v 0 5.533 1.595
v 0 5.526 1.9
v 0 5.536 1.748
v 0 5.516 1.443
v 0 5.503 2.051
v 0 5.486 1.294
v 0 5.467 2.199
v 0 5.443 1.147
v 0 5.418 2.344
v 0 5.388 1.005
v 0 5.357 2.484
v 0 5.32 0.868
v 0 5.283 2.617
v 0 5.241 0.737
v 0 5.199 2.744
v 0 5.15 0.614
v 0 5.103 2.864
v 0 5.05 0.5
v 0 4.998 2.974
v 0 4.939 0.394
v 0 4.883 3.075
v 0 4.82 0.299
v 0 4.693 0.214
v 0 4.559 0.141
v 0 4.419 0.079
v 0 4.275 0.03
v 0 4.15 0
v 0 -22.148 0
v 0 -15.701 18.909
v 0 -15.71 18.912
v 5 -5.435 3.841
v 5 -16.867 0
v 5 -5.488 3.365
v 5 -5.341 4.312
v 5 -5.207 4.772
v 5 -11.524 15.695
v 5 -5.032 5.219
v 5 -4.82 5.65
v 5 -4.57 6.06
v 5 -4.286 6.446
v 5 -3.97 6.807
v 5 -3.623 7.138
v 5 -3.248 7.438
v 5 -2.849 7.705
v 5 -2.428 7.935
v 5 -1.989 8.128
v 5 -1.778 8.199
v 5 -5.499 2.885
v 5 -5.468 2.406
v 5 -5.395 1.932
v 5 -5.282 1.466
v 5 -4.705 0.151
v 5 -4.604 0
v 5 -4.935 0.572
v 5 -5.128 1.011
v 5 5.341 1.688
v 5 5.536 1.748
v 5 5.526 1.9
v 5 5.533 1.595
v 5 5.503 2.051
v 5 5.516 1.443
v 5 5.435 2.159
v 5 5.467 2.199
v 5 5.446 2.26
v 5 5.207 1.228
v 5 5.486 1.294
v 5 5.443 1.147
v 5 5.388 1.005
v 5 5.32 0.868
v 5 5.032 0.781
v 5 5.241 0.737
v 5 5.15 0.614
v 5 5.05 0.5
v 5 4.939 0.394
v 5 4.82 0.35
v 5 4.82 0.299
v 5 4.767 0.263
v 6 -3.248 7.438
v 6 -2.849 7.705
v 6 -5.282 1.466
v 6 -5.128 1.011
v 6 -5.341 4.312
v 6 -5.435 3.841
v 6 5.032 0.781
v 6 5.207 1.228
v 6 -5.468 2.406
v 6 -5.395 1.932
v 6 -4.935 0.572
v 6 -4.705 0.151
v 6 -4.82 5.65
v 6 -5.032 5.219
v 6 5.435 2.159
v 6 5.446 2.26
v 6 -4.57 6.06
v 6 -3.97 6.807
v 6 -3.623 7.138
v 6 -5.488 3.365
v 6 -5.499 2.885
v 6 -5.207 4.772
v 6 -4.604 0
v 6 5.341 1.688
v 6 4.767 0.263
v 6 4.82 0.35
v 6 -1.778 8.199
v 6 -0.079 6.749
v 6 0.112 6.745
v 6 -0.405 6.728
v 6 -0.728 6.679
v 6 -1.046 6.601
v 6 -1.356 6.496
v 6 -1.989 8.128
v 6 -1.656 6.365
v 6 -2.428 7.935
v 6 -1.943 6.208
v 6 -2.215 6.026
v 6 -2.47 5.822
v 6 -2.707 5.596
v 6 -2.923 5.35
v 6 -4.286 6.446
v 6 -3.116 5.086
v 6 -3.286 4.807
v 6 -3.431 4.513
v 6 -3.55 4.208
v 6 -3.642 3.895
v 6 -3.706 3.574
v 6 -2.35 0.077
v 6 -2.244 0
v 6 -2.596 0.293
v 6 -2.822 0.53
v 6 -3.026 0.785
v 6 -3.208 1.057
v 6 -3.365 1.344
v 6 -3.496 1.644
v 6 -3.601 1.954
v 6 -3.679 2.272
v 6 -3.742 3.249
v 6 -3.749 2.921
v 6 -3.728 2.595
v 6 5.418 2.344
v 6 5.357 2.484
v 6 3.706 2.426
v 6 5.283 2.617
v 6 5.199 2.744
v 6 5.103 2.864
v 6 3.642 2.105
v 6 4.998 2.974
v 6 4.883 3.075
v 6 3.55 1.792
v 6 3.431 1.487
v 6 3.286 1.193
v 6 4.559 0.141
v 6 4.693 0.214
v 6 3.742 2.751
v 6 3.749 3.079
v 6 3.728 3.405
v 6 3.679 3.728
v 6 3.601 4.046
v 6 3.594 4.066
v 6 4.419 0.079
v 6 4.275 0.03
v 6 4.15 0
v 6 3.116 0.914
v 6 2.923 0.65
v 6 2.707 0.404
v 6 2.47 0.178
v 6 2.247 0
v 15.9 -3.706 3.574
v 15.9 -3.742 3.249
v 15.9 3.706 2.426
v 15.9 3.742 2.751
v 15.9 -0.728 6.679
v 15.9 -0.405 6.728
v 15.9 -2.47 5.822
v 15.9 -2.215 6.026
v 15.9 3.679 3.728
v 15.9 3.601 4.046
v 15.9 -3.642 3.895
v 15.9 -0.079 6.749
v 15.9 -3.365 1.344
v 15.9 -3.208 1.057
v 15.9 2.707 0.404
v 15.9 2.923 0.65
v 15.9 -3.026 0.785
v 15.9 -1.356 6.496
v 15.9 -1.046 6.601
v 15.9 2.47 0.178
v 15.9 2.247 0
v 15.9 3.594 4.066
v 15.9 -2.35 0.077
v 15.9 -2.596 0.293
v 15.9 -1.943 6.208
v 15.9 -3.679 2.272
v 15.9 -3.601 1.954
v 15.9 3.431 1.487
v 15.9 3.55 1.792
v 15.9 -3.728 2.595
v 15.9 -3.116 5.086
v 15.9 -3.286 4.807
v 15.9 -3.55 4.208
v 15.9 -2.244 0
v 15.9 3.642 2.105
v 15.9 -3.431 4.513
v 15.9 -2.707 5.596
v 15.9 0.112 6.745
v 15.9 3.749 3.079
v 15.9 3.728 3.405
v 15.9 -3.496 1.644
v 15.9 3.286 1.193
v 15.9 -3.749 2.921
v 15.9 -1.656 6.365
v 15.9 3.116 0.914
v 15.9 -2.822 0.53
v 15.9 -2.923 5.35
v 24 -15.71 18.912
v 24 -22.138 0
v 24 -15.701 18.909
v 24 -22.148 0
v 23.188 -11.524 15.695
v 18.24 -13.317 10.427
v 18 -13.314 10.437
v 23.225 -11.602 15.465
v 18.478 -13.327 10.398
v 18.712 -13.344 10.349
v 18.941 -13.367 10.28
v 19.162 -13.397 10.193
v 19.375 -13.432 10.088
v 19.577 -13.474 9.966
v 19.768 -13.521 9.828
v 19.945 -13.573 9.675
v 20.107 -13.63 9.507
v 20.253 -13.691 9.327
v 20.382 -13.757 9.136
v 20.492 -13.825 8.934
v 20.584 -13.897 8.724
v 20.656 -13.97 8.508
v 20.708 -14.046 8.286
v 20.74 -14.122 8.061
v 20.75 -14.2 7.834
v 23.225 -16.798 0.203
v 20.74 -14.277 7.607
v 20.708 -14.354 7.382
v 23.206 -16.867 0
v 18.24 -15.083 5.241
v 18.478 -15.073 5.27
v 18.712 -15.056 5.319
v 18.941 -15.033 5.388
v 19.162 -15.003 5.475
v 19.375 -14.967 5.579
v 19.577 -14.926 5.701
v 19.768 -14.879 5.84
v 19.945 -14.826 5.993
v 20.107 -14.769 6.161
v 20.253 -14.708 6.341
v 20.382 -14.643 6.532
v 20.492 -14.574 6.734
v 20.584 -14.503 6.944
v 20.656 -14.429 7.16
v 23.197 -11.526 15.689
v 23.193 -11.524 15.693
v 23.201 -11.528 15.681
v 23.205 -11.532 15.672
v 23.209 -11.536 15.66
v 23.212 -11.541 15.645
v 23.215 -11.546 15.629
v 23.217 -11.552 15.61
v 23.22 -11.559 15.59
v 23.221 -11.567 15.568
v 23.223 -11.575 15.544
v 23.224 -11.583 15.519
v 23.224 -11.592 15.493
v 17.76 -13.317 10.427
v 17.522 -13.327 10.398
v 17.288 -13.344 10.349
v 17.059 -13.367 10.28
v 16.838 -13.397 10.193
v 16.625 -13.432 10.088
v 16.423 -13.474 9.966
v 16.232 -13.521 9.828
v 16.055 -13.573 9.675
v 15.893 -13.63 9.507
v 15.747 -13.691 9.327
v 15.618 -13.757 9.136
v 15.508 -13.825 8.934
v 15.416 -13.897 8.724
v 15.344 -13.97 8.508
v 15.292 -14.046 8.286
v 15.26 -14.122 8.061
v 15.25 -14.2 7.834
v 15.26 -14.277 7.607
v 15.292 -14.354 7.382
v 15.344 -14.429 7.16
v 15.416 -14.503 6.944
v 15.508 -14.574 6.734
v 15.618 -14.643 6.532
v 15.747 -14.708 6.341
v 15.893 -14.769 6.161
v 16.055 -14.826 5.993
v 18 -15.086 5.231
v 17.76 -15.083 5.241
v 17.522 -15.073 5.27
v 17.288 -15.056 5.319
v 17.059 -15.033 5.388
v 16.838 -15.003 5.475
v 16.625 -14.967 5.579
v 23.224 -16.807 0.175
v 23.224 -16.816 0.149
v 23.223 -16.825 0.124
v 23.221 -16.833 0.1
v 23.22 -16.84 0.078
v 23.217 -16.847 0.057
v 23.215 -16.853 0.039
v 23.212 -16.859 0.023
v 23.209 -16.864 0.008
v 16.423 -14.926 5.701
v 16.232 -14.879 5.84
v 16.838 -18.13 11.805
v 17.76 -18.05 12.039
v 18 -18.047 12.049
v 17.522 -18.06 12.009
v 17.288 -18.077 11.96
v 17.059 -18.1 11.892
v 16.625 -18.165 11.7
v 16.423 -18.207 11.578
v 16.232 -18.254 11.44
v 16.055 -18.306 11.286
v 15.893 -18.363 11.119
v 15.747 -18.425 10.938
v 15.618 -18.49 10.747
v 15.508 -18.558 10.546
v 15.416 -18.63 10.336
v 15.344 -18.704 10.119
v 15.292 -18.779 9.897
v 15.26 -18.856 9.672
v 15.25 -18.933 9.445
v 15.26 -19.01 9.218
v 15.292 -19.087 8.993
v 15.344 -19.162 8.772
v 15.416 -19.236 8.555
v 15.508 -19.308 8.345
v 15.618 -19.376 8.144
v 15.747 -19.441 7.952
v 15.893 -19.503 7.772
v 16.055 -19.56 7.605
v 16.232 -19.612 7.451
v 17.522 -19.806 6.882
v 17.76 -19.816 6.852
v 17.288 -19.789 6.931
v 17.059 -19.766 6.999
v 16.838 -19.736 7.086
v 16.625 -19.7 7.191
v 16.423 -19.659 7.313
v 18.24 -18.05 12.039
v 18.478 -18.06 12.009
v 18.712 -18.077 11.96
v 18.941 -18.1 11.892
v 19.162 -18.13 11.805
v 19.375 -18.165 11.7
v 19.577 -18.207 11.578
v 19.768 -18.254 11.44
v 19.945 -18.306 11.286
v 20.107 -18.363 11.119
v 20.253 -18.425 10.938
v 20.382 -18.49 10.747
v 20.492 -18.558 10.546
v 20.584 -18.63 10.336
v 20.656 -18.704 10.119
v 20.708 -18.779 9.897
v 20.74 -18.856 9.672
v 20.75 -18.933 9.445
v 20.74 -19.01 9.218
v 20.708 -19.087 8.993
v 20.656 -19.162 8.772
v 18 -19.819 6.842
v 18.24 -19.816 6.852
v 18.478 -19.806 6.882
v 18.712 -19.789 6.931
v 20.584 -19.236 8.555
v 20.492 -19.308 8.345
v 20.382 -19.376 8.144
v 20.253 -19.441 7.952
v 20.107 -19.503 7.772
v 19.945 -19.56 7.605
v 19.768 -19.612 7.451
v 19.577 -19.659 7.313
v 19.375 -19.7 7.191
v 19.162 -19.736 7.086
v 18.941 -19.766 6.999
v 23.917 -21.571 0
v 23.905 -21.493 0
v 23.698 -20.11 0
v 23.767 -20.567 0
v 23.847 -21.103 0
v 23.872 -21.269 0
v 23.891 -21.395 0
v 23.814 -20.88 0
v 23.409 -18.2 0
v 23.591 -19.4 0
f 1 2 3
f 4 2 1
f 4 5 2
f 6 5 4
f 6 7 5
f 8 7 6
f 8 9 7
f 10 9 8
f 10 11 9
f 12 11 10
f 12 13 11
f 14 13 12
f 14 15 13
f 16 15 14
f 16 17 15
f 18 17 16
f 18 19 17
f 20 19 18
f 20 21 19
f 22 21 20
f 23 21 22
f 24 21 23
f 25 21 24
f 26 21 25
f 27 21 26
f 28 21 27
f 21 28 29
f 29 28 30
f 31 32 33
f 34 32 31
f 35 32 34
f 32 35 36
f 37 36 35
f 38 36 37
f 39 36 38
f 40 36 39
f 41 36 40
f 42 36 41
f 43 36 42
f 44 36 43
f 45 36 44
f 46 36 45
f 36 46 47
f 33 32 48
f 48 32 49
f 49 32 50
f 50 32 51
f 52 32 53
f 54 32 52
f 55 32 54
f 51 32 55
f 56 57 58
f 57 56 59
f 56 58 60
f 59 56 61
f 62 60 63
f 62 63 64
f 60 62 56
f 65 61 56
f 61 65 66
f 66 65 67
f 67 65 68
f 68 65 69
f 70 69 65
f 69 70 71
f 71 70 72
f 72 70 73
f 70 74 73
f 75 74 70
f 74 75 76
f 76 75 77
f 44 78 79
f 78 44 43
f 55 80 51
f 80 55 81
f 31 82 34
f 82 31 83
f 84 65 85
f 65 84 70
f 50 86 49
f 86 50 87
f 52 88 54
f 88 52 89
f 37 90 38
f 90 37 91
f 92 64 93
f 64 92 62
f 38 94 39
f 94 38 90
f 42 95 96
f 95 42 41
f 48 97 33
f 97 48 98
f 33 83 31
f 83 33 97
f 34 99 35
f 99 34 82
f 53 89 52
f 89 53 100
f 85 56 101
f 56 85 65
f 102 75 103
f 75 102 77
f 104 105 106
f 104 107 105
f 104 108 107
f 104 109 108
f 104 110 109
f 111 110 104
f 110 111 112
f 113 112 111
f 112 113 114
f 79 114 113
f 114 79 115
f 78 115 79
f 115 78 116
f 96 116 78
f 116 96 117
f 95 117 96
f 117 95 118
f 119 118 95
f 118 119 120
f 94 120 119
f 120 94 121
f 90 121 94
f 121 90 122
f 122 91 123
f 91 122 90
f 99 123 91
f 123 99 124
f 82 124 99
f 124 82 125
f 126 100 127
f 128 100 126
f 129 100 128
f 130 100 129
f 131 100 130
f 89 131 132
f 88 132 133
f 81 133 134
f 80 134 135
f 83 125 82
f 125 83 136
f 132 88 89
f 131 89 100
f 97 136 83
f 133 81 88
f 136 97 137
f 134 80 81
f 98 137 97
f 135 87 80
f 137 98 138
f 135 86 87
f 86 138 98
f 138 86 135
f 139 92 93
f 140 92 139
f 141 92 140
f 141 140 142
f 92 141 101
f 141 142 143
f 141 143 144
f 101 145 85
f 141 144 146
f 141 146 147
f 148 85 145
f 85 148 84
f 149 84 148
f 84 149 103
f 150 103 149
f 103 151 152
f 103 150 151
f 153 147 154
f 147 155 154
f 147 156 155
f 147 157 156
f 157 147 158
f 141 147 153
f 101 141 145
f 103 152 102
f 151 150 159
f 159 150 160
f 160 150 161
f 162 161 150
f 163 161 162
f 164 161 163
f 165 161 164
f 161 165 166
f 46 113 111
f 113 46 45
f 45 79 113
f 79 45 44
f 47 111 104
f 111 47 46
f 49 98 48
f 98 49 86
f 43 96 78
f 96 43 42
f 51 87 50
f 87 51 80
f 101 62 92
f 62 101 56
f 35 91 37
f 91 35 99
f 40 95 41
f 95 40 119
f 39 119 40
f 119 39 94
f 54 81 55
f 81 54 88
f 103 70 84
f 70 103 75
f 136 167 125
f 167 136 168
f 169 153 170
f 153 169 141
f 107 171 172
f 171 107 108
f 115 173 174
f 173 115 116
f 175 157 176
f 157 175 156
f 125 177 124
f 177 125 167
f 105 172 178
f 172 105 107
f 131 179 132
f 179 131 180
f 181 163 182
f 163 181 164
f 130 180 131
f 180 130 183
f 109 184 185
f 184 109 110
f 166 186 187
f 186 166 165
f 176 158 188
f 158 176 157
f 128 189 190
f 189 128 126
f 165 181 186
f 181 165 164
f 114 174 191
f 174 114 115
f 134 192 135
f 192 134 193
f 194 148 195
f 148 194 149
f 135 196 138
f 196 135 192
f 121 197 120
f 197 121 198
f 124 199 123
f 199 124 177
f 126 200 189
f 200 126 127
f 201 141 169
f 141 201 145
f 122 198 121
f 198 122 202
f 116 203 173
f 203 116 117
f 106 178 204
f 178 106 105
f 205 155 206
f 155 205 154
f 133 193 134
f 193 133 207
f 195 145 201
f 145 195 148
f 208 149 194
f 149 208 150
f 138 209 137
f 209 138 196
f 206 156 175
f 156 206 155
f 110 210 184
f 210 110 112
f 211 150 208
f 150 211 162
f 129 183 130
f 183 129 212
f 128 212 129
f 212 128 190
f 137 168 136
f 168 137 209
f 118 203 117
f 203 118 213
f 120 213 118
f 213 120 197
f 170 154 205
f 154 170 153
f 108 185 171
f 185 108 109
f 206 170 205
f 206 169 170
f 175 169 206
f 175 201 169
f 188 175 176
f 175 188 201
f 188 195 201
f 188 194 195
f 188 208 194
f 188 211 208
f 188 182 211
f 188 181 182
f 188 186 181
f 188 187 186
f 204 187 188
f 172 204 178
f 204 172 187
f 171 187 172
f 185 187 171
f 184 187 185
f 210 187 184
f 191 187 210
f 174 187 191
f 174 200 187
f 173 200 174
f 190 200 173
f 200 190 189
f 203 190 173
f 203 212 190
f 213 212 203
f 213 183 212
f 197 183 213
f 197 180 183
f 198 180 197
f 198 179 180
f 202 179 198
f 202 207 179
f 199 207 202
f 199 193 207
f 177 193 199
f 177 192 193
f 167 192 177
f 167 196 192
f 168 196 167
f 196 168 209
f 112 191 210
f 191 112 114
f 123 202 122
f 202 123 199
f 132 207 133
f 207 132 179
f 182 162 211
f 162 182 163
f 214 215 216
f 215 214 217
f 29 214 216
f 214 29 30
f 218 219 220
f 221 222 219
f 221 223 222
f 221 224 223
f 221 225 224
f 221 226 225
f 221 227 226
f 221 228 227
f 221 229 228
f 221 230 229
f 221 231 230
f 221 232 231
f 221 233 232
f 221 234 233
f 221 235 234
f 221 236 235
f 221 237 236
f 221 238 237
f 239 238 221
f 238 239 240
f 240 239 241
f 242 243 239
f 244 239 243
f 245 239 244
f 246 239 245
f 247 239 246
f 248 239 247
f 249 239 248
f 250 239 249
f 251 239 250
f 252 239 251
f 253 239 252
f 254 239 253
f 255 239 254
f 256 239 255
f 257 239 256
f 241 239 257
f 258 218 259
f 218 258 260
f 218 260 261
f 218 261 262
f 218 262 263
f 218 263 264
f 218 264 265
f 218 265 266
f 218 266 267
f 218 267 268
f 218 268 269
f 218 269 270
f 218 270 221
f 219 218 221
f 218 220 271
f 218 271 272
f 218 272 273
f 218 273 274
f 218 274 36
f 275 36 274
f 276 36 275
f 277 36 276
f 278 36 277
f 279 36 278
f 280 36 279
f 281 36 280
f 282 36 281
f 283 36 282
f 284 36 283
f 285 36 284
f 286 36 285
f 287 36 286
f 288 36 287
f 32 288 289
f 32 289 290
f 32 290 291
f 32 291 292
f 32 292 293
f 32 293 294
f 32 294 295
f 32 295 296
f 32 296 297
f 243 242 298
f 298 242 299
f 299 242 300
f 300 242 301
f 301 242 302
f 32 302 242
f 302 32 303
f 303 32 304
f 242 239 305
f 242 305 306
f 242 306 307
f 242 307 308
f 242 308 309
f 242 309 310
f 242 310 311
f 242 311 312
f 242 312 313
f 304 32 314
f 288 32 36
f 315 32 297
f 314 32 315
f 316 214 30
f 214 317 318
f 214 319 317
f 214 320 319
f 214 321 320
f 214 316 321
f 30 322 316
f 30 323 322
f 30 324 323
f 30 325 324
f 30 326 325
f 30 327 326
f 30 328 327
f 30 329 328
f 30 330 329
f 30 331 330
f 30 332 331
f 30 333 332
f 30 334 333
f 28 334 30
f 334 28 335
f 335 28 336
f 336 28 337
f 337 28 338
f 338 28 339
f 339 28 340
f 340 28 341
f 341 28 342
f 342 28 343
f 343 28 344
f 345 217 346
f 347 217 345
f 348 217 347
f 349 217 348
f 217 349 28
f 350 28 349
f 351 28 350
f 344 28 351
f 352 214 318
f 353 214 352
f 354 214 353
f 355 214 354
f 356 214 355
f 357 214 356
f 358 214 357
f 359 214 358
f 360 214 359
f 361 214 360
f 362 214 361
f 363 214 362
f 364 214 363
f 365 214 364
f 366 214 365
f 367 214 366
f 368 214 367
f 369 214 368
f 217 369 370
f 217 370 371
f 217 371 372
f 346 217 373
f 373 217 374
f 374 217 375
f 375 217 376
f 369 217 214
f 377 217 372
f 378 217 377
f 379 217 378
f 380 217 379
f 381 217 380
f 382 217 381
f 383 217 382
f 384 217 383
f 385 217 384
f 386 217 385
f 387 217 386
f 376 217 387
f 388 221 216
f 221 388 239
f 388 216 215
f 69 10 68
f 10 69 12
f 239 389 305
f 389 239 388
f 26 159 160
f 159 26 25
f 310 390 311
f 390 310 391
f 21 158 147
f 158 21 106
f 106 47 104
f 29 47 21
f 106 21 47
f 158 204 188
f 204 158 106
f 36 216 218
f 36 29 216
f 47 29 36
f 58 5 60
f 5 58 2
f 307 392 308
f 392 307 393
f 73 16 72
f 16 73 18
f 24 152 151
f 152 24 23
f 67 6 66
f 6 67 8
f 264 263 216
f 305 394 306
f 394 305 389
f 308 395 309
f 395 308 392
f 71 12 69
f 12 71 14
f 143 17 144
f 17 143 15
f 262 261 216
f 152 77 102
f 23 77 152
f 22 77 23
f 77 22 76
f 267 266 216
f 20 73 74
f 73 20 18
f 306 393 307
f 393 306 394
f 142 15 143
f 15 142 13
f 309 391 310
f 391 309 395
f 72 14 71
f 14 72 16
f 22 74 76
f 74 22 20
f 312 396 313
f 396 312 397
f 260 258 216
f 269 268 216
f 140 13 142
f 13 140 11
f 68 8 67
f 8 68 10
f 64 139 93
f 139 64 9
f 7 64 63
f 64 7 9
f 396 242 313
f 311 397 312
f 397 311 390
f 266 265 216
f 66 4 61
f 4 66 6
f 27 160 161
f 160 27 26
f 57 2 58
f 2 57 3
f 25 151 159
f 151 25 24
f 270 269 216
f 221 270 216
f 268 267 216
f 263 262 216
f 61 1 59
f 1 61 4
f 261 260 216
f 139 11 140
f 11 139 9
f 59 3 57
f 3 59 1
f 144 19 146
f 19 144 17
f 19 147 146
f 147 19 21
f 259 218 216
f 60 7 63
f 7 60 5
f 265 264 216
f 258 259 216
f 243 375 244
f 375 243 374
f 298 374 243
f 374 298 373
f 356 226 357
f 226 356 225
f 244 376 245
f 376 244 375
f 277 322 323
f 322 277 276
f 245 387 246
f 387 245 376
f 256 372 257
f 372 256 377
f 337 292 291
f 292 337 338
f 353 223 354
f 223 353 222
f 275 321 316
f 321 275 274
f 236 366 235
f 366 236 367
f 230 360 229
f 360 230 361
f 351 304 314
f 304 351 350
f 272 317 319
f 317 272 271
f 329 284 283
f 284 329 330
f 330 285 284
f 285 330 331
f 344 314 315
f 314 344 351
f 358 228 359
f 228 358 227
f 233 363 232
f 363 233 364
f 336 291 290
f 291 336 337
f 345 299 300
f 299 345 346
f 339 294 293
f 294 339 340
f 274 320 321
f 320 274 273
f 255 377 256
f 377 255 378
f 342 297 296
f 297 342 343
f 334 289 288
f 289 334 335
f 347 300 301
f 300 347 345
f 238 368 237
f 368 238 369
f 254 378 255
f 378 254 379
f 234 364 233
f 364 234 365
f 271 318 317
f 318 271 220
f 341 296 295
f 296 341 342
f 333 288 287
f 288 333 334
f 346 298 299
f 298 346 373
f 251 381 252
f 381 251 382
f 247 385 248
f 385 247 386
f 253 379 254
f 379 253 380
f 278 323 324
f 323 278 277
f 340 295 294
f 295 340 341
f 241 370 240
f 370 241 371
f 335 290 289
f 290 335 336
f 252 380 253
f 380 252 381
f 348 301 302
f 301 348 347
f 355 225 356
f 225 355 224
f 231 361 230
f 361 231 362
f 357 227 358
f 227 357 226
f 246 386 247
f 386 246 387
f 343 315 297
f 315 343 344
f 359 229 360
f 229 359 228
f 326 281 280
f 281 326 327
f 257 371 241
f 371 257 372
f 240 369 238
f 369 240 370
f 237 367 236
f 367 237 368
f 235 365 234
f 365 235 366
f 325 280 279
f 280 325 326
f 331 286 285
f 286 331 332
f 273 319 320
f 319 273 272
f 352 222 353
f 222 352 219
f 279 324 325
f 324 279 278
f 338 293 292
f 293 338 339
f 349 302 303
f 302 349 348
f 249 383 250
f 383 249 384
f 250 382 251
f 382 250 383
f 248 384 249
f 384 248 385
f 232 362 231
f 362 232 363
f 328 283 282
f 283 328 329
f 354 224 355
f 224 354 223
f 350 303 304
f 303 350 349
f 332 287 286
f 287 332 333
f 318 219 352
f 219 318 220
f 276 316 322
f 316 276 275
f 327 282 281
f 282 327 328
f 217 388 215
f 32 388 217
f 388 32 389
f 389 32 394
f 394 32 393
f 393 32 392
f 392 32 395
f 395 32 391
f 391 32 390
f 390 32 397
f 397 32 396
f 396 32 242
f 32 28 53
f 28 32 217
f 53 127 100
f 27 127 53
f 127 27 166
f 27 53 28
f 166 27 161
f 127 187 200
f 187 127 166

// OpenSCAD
// file: configuration.scad
$fn = 18;

slop = .2;

wall = 5;

bolt_slop = .5;
nut_slop = .85;
bolt_dia = 5+bolt_slop;
bolt_rad = bolt_dia/2;
bolt_cap_dia = 10+bolt_slop;
bolt_cap_rad = bolt_cap_dia/2;
nut_dia = 9+nut_slop;
nut_rad = nut_dia/2;
nut_height = 3.25;
lock_nut_height = 5.25;

m3bolt_dia = 3+bolt_slop;
m3bolt_rad = m3bolt_dia/2;
m3nut_dia = 6.1+nut_slop;
m3nut_rad = m3nut_dia/2;
m3nut_height = 3;

ext_x = 20+slop;
ext_y = 60+slop;
// main file
include <configuration.scad>;

vertical_guide();

module spool_hook(){
	$fn=72;
	outer_rad = 30/2;
	bearing_bore = 8/2-.25;
	bearing_rest = 11/2;
	bearing_rest_width = 1;
	bearing_width = 6/2;
	
	difference(){
		union(){
			cylinder(r=outer_rad, h=wall);
			translate([0,0,wall-.1]) cylinder(r=bearing_rest, h=bearing_rest_width+.1);
			translate([0,0,wall+bearing_rest_width-.1]) cylinder(r=bearing_bore, h=bearing_width);
		}

		translate([0,0,-.1]) cylinder(r=bolt_rad, h=50);
	}
}

module vertical_guide(){
	$fn=72;
	outer_rad = 30/2;
	bearing_bore = 8/2-.25;
	bearing_rest = 11/2;
	bearing_rest_width = 1;
	bearing_width = 10;
	
difference(){
	translate([0,0,3])
	rotate([0,90,0])
	rotate([0,0,-18.8])
	difference(){
		intersection(){
			union(){
				cylinder(r=outer_rad+wall*2, h=wall);
				translate([0,0,wall-.1]) cylinder(r=bearing_rest, h=bearing_rest_width+.1);
				translate([0,0,wall+bearing_rest_width-.1]) cylinder(r=bearing_bore, h=bearing_width);
				translate([-10,-outer_rad-wall, 0]) cube([20,wall,24]);
			}

			hull(){
				translate([-10,-outer_rad-wall, 0]) cube([20,.01,24]);
				translate([0,4,0]) cylinder(r=bearing_bore-2, h=20);
			}
		}

		translate([0,-11,18]) rotate([90,0,0]) cylinder(r=bolt_rad, h=10);
	}
	
	translate([0,0,-10]) cube([50,50,20],center=true);
}
}
